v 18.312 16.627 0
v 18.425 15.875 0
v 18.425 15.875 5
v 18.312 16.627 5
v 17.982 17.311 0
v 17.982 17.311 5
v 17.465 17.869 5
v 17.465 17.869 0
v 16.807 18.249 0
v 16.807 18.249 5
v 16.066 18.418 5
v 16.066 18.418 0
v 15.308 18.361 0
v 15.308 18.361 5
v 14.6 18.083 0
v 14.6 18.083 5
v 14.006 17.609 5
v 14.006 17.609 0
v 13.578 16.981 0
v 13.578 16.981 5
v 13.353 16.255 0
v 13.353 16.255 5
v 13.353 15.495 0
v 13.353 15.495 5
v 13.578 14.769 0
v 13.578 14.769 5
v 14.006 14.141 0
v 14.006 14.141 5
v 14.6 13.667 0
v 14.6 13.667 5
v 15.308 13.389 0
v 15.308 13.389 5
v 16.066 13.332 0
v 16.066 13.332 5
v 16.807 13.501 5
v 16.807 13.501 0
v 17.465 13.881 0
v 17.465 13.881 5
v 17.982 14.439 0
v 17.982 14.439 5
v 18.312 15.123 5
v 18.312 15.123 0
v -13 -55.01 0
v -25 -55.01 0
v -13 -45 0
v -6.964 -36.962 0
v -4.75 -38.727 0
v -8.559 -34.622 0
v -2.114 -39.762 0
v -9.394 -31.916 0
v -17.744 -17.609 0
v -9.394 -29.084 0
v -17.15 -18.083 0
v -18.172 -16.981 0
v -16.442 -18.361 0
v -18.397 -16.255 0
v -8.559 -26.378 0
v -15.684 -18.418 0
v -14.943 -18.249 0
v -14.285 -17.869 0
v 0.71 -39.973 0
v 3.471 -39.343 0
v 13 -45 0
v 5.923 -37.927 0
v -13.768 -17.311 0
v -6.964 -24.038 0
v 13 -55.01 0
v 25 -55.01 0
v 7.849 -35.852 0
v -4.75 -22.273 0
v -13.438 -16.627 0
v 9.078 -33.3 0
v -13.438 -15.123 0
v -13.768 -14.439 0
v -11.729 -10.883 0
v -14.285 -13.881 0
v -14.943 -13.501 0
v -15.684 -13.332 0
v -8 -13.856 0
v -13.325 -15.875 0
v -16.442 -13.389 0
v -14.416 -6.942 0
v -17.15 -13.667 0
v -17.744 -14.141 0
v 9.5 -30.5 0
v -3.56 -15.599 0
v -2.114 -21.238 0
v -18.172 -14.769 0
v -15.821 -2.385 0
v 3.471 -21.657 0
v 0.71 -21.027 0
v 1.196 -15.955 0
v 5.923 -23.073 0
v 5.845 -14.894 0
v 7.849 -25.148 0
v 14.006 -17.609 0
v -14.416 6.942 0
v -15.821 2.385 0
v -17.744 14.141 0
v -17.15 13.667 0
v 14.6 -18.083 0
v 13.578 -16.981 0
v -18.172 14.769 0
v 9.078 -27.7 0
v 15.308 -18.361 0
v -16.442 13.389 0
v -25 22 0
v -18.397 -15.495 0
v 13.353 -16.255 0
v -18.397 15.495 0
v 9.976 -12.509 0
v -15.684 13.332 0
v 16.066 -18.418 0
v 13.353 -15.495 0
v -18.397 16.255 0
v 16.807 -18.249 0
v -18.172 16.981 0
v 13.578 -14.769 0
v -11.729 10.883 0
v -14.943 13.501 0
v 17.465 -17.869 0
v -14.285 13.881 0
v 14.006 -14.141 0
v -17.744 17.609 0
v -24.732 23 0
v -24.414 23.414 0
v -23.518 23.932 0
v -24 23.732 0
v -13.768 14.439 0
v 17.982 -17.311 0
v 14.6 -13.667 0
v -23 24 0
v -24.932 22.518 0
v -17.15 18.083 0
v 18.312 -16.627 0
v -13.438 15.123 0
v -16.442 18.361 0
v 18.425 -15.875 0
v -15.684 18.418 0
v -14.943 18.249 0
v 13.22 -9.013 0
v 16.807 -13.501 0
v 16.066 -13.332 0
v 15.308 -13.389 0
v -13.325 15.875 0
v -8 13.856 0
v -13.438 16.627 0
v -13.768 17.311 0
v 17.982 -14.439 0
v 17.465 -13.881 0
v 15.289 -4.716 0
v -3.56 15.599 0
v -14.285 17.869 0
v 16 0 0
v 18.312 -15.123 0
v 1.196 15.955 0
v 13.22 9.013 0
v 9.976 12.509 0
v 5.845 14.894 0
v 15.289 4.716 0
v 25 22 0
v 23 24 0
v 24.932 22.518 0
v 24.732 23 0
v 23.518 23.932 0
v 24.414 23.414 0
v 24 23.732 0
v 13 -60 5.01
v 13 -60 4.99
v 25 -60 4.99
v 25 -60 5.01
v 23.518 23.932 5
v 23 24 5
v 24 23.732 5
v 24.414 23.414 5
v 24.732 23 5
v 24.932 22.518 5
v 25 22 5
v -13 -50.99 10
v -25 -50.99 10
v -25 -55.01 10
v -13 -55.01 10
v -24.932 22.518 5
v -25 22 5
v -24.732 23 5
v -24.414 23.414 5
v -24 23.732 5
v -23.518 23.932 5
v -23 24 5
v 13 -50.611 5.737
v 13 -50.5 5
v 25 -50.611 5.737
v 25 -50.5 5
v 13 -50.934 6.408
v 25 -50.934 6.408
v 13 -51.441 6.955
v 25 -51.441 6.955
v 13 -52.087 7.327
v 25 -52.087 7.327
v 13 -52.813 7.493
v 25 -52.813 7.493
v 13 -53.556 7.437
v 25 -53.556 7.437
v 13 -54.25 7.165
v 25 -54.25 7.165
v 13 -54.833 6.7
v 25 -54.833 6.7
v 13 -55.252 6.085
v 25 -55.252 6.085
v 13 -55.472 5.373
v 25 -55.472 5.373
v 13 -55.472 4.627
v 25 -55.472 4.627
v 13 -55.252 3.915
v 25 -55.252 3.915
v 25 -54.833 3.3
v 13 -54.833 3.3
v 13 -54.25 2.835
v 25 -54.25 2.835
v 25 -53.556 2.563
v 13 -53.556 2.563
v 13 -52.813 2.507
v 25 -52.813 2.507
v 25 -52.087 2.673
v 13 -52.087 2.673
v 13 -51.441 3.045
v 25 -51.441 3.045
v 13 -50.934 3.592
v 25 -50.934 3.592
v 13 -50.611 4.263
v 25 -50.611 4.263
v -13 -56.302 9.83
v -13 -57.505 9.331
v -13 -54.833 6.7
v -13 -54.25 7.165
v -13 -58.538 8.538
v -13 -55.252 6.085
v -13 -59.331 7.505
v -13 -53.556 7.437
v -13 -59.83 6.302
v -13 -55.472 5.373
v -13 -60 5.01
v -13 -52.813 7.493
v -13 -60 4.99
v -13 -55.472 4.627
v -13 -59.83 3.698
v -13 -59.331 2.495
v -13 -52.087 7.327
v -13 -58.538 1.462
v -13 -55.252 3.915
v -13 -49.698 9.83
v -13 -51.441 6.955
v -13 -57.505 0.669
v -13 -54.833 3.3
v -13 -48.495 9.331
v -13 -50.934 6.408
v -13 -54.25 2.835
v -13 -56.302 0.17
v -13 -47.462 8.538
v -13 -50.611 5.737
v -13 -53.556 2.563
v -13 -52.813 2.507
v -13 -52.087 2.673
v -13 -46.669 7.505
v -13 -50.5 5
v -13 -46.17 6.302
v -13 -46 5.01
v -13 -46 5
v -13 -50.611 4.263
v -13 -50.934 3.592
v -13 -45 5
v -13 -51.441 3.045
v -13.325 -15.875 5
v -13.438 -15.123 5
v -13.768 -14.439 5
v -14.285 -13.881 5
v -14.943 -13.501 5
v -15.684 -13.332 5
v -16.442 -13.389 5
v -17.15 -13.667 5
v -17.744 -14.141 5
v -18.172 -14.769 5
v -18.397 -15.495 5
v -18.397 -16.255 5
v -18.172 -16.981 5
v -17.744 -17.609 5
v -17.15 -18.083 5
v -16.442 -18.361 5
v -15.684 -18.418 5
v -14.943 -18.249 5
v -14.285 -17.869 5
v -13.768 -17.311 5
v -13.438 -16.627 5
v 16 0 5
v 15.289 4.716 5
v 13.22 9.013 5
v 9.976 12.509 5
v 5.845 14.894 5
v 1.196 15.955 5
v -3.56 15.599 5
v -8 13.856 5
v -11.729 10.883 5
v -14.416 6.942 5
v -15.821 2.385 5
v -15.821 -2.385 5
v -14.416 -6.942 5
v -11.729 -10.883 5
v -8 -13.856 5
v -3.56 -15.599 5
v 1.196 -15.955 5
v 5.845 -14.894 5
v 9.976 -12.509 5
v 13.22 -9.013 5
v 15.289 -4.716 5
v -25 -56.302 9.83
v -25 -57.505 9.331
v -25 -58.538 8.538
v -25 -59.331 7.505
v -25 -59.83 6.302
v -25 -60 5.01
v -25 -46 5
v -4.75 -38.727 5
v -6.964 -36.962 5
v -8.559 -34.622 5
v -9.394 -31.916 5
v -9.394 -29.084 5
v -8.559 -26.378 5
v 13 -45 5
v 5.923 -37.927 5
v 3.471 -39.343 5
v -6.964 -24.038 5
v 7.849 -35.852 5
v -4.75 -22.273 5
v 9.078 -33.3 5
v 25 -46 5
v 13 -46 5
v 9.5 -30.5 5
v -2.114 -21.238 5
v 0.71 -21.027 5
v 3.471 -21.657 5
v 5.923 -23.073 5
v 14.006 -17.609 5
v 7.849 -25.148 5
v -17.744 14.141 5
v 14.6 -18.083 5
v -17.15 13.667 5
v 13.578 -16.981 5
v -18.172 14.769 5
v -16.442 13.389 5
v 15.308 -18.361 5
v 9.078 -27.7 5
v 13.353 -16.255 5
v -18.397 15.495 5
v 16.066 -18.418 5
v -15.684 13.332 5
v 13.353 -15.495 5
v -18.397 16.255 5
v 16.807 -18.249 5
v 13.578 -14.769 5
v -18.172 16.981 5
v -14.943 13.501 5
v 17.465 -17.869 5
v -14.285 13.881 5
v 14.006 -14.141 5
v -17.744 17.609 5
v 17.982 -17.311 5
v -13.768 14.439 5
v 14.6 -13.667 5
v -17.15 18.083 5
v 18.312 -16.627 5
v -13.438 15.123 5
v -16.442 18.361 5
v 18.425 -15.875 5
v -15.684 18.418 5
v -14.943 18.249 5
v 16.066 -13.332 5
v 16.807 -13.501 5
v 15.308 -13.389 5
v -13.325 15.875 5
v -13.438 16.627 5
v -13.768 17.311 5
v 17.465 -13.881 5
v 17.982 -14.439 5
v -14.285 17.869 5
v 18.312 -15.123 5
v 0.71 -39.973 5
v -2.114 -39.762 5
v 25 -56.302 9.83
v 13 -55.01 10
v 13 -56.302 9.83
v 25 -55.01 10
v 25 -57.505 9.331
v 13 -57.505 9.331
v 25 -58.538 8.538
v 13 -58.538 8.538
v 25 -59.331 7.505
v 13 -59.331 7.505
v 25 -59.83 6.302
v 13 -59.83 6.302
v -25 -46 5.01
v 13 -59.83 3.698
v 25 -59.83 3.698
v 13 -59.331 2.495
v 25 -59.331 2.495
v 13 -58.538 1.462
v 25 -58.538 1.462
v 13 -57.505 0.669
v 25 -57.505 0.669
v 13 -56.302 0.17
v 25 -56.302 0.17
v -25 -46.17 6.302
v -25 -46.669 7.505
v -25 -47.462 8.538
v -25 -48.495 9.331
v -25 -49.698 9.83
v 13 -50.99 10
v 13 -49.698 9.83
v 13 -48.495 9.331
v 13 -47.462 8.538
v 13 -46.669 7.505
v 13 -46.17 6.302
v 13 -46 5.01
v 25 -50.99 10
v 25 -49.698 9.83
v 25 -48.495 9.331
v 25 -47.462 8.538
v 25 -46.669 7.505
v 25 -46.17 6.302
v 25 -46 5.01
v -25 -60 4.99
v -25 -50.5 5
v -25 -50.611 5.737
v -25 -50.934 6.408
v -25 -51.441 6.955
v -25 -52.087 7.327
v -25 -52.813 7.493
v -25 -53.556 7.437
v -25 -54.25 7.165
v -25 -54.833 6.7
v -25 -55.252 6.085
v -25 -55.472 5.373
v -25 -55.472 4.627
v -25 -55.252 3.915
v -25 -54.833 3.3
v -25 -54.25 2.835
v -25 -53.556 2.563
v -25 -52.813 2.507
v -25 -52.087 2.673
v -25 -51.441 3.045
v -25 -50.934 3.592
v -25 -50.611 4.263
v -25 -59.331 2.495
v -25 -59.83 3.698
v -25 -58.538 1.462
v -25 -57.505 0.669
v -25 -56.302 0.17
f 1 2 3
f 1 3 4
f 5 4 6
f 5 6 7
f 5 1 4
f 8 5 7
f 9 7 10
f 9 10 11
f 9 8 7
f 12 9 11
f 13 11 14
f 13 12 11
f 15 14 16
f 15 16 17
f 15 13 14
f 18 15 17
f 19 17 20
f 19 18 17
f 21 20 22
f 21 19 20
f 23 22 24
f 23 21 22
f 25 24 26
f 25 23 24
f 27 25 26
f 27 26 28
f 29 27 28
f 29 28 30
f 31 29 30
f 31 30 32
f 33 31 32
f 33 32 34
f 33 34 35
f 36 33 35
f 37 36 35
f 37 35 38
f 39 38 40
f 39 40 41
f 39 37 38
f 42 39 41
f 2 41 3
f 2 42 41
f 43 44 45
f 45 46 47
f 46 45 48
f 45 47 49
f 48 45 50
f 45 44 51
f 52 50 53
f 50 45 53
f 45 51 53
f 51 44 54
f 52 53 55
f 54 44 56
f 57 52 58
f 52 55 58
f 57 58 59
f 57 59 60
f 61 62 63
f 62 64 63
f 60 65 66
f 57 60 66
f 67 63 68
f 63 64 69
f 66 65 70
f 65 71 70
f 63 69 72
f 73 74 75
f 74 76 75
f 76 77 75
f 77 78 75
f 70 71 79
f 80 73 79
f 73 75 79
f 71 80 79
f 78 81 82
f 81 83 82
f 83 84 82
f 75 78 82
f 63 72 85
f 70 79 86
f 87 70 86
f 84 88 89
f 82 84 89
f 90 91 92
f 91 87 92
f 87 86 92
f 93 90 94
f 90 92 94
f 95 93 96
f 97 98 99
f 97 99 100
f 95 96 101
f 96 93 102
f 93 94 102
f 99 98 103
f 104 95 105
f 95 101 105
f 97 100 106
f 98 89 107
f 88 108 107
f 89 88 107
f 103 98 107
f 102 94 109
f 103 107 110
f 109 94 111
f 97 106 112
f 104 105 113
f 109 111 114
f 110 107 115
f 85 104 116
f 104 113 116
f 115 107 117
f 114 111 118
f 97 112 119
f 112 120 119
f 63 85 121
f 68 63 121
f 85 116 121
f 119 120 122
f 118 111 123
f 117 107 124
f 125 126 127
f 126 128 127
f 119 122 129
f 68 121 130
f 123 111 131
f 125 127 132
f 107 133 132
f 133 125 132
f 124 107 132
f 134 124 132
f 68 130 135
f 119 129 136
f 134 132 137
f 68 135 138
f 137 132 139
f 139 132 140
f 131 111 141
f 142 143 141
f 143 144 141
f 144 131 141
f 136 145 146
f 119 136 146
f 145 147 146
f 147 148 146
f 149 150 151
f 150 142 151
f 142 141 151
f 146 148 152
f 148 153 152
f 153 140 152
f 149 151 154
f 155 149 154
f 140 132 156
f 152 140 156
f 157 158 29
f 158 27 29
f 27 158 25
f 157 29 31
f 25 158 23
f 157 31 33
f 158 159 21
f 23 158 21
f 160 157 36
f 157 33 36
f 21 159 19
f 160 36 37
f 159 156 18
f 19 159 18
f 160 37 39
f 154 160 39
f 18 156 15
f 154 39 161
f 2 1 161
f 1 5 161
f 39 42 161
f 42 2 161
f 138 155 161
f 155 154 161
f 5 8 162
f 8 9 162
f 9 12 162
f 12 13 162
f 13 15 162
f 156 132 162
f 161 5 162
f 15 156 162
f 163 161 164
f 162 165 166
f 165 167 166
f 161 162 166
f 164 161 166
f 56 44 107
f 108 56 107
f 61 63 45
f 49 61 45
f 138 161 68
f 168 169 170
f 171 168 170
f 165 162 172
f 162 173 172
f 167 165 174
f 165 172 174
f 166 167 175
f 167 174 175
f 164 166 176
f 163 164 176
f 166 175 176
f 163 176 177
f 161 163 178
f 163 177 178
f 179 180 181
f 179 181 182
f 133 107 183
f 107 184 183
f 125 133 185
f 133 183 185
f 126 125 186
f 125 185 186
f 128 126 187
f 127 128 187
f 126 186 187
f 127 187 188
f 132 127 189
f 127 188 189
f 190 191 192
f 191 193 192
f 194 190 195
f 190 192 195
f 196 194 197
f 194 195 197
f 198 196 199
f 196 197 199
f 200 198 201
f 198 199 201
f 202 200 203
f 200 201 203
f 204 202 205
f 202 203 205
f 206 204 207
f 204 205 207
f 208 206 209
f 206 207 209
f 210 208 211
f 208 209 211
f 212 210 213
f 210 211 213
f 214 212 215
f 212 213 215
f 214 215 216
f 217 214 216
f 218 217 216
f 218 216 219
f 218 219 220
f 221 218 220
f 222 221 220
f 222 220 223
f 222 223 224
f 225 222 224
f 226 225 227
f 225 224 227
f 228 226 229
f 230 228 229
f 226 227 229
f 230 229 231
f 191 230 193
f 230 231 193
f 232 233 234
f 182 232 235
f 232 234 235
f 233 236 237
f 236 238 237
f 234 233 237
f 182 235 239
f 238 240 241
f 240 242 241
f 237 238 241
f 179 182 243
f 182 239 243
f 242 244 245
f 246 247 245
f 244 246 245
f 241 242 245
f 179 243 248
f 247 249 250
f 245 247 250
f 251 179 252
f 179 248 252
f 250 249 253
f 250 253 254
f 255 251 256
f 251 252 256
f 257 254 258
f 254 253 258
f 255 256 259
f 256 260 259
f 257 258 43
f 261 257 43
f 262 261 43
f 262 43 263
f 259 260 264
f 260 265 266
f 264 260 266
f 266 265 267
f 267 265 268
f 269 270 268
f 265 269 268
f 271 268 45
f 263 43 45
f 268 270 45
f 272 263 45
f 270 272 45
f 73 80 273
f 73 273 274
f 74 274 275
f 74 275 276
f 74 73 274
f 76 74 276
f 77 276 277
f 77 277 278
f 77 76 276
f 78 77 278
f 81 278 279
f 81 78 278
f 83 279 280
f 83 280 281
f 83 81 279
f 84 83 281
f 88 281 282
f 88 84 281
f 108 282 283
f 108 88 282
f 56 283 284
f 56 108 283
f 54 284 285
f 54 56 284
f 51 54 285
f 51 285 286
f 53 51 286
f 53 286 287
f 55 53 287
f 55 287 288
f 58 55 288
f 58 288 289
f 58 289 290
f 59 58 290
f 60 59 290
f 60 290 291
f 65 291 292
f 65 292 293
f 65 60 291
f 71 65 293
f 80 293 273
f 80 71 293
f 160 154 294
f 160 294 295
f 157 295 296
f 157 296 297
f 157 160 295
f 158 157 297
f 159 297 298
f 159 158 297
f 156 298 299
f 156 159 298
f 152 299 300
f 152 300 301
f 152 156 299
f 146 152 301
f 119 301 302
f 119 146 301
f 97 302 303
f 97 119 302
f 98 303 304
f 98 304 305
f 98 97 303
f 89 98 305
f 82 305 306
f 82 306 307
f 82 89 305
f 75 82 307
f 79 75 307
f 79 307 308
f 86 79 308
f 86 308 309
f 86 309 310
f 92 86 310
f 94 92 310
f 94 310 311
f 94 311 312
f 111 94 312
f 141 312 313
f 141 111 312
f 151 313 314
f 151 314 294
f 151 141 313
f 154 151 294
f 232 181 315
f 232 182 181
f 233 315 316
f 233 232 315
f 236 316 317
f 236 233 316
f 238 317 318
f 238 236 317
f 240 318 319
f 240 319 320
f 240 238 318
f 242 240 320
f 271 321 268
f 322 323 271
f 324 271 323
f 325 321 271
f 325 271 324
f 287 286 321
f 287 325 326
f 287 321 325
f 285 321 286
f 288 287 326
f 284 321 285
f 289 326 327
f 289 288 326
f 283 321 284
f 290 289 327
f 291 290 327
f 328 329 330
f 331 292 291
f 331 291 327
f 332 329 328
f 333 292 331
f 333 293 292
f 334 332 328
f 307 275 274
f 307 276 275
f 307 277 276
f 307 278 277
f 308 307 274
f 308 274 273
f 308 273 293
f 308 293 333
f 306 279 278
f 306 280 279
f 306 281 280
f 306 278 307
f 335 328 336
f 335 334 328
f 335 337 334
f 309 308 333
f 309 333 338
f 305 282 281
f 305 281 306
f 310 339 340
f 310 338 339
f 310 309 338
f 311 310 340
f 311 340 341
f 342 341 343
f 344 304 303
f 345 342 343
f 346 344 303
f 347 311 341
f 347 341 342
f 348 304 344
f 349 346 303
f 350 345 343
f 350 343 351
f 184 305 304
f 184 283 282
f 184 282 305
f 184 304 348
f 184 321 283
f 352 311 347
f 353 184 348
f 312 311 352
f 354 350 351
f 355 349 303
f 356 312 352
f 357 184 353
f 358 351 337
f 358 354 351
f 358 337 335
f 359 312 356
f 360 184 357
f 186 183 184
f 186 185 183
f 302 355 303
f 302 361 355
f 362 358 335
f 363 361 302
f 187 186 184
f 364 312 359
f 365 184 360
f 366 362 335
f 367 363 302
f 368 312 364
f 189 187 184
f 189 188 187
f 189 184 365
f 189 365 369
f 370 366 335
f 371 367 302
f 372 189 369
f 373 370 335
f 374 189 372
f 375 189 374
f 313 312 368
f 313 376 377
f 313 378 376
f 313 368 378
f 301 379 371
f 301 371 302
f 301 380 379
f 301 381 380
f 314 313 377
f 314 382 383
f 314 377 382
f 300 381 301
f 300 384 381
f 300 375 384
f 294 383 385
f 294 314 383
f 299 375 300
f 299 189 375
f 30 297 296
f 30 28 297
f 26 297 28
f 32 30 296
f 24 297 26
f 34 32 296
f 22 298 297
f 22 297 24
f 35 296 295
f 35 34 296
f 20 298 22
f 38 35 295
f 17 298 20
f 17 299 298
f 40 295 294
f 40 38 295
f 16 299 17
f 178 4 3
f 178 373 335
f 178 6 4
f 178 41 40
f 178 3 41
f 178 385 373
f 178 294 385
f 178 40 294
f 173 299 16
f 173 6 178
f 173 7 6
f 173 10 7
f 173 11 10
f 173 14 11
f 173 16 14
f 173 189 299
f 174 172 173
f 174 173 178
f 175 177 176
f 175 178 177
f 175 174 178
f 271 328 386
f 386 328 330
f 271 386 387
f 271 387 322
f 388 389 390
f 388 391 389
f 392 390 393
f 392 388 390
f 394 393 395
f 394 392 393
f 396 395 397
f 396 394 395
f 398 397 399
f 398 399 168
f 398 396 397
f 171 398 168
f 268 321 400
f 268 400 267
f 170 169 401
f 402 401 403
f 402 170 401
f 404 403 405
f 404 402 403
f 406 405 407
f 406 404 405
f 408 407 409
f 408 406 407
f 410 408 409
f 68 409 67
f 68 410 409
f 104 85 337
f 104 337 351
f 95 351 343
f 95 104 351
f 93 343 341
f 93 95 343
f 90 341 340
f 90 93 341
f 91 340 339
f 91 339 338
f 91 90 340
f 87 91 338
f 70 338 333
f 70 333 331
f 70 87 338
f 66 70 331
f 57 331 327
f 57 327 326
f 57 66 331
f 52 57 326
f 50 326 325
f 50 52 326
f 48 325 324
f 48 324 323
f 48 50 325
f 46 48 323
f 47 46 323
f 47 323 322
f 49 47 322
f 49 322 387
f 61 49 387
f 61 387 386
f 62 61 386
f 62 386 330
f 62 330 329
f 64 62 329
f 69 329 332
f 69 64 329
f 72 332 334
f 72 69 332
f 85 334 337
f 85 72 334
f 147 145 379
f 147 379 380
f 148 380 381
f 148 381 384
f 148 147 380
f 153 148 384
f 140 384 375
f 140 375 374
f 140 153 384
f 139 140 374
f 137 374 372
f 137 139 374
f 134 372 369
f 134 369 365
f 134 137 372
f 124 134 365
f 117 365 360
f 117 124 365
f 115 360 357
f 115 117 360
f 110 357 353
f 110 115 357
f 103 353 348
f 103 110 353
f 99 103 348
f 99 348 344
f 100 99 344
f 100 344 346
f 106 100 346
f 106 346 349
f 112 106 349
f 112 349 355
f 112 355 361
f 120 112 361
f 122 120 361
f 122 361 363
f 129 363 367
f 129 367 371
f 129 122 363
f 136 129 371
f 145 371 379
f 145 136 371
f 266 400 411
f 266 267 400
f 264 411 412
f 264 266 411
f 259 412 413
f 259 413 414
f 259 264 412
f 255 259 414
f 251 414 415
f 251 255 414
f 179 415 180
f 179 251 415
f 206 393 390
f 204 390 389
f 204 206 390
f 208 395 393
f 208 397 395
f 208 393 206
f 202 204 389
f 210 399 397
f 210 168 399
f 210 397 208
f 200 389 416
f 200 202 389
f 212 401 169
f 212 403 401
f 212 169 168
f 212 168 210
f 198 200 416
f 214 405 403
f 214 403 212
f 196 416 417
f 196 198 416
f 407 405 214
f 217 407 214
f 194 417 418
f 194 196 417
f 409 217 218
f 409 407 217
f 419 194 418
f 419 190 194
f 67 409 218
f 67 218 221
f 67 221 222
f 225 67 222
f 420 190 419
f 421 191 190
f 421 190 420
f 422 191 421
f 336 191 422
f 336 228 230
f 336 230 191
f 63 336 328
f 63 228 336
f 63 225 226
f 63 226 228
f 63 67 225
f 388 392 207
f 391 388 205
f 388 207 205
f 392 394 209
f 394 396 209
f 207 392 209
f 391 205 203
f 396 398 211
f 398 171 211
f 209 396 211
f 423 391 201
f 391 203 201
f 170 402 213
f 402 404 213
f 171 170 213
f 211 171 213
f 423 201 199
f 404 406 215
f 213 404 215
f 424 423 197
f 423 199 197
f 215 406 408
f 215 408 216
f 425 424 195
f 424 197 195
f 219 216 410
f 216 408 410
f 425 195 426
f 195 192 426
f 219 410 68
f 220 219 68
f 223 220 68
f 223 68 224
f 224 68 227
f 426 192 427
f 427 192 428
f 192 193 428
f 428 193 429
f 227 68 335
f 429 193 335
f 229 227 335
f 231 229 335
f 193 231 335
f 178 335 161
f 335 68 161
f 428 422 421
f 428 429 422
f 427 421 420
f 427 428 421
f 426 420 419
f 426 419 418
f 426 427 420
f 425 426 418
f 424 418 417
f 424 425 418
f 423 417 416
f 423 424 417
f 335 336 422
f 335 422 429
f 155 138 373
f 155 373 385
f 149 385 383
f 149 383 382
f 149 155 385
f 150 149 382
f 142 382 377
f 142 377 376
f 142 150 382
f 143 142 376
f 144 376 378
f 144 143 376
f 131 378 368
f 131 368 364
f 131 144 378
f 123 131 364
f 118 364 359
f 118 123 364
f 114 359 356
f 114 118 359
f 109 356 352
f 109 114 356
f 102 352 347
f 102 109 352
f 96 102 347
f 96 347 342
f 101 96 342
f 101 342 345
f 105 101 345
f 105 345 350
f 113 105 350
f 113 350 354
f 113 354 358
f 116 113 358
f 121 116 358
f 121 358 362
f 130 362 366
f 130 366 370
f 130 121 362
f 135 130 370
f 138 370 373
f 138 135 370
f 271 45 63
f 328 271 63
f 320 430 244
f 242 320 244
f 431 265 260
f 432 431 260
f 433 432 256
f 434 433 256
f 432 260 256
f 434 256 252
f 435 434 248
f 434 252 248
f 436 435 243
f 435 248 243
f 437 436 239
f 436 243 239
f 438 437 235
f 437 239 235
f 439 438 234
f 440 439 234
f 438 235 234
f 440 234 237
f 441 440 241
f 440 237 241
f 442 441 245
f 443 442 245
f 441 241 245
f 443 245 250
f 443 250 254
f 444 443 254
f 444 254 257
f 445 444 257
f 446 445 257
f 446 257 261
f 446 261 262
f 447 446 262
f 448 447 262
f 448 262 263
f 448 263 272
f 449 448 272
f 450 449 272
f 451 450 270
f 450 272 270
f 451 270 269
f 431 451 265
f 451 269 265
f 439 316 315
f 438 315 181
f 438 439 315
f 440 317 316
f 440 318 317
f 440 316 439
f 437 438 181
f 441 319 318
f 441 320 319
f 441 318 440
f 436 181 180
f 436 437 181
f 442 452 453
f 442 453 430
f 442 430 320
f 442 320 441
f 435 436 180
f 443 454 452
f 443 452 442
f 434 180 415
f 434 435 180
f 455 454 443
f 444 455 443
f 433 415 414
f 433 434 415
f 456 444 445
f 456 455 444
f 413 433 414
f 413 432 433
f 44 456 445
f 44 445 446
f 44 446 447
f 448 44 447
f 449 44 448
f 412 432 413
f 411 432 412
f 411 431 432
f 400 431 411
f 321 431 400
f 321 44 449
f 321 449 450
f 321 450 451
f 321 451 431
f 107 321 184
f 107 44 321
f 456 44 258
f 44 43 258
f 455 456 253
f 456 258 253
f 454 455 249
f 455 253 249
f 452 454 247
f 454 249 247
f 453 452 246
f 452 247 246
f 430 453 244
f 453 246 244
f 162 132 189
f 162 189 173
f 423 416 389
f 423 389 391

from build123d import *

# Parameters (mm, degrees)
SKETCH_W        = 50
SKETCH_H        = 70
SKETCH_R        = 16
SKETCH_R_2      = 2.55
SKETCH_R_3      = 9.5
PAD_DEPTH       = 5
SKETCH001_W     = 12
SKETCH001_H     = 14
PAD001_DEPTH    = 10
SKETCH002_R     = 2.5
POCKET_DEPTH    = 25
SKETCH003_W     = 26
SKETCH003_H     = 4
POCKET001_DEPTH = 10
FILLET_R        = 4.99
FILLET001_R     = 2


with BuildPart() as part:
    # Sketch → Pad (new body)
    with BuildSketch(Plane.XY):
        with Locations((0, -11)):
            Rectangle(SKETCH_W, SKETCH_H)
        Circle(SKETCH_R, mode=Mode.SUBTRACT)
        with Locations((15.875, 15.875)):
            Circle(SKETCH_R_2, mode=Mode.SUBTRACT)
        with Locations((-15.875, 15.875)):
            Circle(SKETCH_R_2, mode=Mode.SUBTRACT)
        with Locations((-15.875, -15.875)):
            Circle(SKETCH_R_2, mode=Mode.SUBTRACT)
        with Locations((15.875, -15.875)):
            Circle(SKETCH_R_2, mode=Mode.SUBTRACT)
        with Locations((0, -30.5)):
            Circle(SKETCH_R_3, mode=Mode.SUBTRACT)
    extrude(amount=PAD_DEPTH)

    # Sketch001 → Pad001 (join)
    with BuildSketch(Plane.XY):
        with Locations((-19, -53)):
            Rectangle(SKETCH001_W, SKETCH001_H)
        with Locations((19, -53)):
            Rectangle(SKETCH001_W, SKETCH001_H)
    extrude(amount=PAD001_DEPTH)

    # Sketch002 → Pocket (cut, symmetric)
    with BuildSketch(Plane.YZ):
        with Locations((-53, 5)):
            Circle(SKETCH002_R)
    extrude(amount=POCKET_DEPTH, both=True, mode=Mode.SUBTRACT)

    # Sketch003 → Pocket001 (cut)
    with BuildSketch(Plane.XY):
        with Locations((0, -47)):
            Rectangle(SKETCH003_W, SKETCH003_H)
    extrude(amount=POCKET001_DEPTH, mode=Mode.SUBTRACT)

    # Fillet
    fillet_edges = [part.edges().sort_by_distance(p)[0] for p in [
        (-19, -46, 10),
        (-19, -60, 10),
        (-19, -60, 0),
        (19, -60, 0),
        (19, -60, 10),
        (19, -46, 10),
    ]]
    fillet(fillet_edges, radius=FILLET_R)

    # Fillet001
    fillet001_edges = [part.edges().sort_by_distance(p)[0] for p in [
        (25, 24, 2.5),
        (-25, 24, 2.5),
    ]]
    fillet(fillet001_edges, radius=FILLET001_R)


solid = part.part
